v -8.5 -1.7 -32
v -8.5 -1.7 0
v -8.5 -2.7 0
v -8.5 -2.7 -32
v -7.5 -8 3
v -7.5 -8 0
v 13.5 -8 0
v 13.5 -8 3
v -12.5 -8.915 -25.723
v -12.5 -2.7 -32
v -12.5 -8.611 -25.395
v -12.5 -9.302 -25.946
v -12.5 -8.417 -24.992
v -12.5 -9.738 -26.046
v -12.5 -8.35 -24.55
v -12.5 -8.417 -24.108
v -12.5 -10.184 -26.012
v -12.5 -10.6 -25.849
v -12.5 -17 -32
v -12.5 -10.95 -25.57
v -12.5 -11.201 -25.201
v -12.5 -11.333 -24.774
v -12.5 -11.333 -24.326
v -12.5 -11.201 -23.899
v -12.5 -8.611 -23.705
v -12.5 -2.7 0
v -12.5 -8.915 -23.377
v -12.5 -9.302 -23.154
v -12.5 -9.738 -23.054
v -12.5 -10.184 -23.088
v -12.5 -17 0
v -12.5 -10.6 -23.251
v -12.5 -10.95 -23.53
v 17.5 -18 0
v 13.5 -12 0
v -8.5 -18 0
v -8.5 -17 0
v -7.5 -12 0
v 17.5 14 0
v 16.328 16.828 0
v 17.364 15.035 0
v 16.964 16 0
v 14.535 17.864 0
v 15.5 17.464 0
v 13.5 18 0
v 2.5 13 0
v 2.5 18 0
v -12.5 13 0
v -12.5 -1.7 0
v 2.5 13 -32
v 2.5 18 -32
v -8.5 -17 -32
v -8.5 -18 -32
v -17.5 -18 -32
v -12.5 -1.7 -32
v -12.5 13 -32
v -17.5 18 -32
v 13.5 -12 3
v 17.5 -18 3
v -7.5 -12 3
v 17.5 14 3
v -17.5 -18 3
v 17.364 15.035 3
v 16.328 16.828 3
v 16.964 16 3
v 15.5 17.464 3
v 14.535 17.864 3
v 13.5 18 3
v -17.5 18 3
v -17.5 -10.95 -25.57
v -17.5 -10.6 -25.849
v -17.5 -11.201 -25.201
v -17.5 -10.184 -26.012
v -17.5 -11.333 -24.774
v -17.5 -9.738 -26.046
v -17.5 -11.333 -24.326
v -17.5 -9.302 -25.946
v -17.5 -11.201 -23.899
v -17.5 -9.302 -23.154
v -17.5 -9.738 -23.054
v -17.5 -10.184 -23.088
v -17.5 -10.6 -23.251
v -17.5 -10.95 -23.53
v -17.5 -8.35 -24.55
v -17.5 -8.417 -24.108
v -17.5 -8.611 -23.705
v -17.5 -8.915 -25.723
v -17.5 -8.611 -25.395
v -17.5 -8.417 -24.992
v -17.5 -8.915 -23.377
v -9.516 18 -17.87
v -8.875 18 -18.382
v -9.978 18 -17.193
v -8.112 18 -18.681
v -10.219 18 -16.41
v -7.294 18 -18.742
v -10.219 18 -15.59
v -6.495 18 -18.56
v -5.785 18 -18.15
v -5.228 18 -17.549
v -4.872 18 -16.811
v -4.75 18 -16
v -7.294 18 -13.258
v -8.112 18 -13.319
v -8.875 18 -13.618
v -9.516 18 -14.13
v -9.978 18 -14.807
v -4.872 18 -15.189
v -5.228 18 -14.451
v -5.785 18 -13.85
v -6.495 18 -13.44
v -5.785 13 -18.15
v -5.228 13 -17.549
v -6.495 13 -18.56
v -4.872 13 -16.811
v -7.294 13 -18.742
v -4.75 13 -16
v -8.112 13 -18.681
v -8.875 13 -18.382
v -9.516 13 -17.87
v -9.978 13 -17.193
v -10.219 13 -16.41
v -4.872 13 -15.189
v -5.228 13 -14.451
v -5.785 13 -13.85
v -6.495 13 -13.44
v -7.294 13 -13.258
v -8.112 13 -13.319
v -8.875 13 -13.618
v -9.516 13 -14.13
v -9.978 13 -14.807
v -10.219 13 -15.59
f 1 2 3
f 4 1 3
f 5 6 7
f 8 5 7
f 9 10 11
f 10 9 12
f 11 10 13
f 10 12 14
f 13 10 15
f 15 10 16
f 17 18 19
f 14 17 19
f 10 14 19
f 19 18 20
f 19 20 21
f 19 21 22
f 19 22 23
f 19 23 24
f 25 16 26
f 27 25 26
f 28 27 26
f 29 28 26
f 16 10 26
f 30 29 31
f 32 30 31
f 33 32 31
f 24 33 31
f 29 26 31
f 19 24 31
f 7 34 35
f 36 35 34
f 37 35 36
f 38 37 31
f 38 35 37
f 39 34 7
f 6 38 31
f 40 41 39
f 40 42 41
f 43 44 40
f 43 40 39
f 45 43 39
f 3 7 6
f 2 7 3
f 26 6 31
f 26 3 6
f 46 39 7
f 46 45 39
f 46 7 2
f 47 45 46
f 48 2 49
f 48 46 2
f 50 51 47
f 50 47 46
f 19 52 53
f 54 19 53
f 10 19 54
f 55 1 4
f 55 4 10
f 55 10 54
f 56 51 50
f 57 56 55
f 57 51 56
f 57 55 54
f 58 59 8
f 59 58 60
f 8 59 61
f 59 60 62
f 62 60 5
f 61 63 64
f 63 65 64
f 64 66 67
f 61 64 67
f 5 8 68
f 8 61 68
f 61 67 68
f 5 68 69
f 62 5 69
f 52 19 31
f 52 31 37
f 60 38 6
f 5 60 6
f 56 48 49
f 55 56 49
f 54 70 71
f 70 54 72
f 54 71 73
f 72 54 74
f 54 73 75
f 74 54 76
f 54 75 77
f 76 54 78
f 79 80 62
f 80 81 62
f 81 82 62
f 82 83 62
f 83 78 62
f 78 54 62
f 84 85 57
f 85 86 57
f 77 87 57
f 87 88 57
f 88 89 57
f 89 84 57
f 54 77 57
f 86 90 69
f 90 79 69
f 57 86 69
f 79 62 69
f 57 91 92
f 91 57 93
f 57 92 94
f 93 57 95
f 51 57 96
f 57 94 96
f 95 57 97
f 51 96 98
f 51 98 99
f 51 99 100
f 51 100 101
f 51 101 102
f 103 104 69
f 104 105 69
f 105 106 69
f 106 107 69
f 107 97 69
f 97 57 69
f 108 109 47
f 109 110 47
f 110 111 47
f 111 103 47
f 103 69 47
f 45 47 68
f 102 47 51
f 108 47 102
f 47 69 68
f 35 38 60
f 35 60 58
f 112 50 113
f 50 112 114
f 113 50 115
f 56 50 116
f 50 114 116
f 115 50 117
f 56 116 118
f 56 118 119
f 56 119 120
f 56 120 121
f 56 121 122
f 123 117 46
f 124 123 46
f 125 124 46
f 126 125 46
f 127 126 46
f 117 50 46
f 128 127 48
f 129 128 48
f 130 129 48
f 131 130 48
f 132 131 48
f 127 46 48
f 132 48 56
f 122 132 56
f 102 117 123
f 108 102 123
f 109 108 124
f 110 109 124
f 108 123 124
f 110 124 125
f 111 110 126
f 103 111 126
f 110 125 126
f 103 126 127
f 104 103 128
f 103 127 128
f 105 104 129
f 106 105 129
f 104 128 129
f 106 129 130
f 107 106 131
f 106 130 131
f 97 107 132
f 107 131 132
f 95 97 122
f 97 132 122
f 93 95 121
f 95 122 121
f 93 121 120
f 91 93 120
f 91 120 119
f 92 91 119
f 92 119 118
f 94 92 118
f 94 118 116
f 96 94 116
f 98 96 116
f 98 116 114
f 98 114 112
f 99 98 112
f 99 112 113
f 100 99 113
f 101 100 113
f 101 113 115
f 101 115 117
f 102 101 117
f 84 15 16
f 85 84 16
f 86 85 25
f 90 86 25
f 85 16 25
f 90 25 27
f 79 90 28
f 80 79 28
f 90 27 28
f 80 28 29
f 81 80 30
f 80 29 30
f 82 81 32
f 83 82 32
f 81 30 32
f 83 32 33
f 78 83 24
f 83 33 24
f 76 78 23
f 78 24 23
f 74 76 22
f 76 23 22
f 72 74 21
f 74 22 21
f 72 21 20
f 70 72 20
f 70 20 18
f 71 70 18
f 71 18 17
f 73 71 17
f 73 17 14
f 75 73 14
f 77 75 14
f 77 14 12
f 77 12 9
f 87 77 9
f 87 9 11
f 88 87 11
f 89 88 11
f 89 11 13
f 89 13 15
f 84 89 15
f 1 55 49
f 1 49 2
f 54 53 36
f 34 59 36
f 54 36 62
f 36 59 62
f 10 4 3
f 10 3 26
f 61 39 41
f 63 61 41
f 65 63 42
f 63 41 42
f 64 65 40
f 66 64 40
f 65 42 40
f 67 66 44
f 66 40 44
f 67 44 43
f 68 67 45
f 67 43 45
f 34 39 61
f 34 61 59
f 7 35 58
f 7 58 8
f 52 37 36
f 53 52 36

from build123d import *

# Parameters (mm, degrees)
SKETCH086_W     = 21
SKETCH086_H     = 4
PAD052_DEPTH    = 3
PAD053_DEPTH    = 32
SKETCH088_R     = 2.75
POCKET027_DEPTH = 5.001
SKETCH089_R     = 1.5
POCKET028_DEPTH = 5.001


with BuildPart() as part:
    # Sketch086 → Pad052 (new body)
    with BuildSketch(Plane.XY):
        with BuildLine():
            Line((-17.5, 18), (13.5, 18))
            ThreePointArc((17.5, 14), (16.328427, 16.828427), (13.5, 18))
            Line((17.5, 14), (17.5, -18))
            Line((17.5, -18), (-17.5, -18))
            Line((-17.5, -18), (-17.5, 18))
        make_face()
        with Locations((3, -10)):
            Rectangle(SKETCH086_W, SKETCH086_H, mode=Mode.SUBTRACT)
    extrude(amount=PAD052_DEPTH)

    # Sketch087 → Pad053 (join)
    with BuildSketch(Plane(origin=(0, 0, 0), x_dir=(-1, 0, 0), z_dir=(0, 0, -1))):
        Polygon((17.5, 18), (-2.5, 18), (-2.5, 13), (12.5, 13), (12.5, -1.7), (8.5, -1.7), (8.5, -2.7), (12.5, -2.7), (12.5, -17), (8.5, -17), (8.5, -18), (17.5, -18), align=None)
    extrude(amount=PAD053_DEPTH)

    # Sketch088 (on Face16 of Pad053) → Pocket027 (cut, through all)
    with BuildSketch(Plane.XZ.offset(-13)):
        with Locations((-7.5, -16)):
            Circle(SKETCH088_R)
    extrude(amount=-POCKET027_DEPTH, mode=Mode.SUBTRACT)

    # Sketch089 (on Face11 of Pocket027) → Pocket028 (cut, through all)
    with BuildSketch(Plane.YZ.offset(-12.5)):
        with Locations((-9.85, -24.55)):
            Circle(SKETCH089_R)
    extrude(amount=-POCKET028_DEPTH, mode=Mode.SUBTRACT)


solid = part.part
